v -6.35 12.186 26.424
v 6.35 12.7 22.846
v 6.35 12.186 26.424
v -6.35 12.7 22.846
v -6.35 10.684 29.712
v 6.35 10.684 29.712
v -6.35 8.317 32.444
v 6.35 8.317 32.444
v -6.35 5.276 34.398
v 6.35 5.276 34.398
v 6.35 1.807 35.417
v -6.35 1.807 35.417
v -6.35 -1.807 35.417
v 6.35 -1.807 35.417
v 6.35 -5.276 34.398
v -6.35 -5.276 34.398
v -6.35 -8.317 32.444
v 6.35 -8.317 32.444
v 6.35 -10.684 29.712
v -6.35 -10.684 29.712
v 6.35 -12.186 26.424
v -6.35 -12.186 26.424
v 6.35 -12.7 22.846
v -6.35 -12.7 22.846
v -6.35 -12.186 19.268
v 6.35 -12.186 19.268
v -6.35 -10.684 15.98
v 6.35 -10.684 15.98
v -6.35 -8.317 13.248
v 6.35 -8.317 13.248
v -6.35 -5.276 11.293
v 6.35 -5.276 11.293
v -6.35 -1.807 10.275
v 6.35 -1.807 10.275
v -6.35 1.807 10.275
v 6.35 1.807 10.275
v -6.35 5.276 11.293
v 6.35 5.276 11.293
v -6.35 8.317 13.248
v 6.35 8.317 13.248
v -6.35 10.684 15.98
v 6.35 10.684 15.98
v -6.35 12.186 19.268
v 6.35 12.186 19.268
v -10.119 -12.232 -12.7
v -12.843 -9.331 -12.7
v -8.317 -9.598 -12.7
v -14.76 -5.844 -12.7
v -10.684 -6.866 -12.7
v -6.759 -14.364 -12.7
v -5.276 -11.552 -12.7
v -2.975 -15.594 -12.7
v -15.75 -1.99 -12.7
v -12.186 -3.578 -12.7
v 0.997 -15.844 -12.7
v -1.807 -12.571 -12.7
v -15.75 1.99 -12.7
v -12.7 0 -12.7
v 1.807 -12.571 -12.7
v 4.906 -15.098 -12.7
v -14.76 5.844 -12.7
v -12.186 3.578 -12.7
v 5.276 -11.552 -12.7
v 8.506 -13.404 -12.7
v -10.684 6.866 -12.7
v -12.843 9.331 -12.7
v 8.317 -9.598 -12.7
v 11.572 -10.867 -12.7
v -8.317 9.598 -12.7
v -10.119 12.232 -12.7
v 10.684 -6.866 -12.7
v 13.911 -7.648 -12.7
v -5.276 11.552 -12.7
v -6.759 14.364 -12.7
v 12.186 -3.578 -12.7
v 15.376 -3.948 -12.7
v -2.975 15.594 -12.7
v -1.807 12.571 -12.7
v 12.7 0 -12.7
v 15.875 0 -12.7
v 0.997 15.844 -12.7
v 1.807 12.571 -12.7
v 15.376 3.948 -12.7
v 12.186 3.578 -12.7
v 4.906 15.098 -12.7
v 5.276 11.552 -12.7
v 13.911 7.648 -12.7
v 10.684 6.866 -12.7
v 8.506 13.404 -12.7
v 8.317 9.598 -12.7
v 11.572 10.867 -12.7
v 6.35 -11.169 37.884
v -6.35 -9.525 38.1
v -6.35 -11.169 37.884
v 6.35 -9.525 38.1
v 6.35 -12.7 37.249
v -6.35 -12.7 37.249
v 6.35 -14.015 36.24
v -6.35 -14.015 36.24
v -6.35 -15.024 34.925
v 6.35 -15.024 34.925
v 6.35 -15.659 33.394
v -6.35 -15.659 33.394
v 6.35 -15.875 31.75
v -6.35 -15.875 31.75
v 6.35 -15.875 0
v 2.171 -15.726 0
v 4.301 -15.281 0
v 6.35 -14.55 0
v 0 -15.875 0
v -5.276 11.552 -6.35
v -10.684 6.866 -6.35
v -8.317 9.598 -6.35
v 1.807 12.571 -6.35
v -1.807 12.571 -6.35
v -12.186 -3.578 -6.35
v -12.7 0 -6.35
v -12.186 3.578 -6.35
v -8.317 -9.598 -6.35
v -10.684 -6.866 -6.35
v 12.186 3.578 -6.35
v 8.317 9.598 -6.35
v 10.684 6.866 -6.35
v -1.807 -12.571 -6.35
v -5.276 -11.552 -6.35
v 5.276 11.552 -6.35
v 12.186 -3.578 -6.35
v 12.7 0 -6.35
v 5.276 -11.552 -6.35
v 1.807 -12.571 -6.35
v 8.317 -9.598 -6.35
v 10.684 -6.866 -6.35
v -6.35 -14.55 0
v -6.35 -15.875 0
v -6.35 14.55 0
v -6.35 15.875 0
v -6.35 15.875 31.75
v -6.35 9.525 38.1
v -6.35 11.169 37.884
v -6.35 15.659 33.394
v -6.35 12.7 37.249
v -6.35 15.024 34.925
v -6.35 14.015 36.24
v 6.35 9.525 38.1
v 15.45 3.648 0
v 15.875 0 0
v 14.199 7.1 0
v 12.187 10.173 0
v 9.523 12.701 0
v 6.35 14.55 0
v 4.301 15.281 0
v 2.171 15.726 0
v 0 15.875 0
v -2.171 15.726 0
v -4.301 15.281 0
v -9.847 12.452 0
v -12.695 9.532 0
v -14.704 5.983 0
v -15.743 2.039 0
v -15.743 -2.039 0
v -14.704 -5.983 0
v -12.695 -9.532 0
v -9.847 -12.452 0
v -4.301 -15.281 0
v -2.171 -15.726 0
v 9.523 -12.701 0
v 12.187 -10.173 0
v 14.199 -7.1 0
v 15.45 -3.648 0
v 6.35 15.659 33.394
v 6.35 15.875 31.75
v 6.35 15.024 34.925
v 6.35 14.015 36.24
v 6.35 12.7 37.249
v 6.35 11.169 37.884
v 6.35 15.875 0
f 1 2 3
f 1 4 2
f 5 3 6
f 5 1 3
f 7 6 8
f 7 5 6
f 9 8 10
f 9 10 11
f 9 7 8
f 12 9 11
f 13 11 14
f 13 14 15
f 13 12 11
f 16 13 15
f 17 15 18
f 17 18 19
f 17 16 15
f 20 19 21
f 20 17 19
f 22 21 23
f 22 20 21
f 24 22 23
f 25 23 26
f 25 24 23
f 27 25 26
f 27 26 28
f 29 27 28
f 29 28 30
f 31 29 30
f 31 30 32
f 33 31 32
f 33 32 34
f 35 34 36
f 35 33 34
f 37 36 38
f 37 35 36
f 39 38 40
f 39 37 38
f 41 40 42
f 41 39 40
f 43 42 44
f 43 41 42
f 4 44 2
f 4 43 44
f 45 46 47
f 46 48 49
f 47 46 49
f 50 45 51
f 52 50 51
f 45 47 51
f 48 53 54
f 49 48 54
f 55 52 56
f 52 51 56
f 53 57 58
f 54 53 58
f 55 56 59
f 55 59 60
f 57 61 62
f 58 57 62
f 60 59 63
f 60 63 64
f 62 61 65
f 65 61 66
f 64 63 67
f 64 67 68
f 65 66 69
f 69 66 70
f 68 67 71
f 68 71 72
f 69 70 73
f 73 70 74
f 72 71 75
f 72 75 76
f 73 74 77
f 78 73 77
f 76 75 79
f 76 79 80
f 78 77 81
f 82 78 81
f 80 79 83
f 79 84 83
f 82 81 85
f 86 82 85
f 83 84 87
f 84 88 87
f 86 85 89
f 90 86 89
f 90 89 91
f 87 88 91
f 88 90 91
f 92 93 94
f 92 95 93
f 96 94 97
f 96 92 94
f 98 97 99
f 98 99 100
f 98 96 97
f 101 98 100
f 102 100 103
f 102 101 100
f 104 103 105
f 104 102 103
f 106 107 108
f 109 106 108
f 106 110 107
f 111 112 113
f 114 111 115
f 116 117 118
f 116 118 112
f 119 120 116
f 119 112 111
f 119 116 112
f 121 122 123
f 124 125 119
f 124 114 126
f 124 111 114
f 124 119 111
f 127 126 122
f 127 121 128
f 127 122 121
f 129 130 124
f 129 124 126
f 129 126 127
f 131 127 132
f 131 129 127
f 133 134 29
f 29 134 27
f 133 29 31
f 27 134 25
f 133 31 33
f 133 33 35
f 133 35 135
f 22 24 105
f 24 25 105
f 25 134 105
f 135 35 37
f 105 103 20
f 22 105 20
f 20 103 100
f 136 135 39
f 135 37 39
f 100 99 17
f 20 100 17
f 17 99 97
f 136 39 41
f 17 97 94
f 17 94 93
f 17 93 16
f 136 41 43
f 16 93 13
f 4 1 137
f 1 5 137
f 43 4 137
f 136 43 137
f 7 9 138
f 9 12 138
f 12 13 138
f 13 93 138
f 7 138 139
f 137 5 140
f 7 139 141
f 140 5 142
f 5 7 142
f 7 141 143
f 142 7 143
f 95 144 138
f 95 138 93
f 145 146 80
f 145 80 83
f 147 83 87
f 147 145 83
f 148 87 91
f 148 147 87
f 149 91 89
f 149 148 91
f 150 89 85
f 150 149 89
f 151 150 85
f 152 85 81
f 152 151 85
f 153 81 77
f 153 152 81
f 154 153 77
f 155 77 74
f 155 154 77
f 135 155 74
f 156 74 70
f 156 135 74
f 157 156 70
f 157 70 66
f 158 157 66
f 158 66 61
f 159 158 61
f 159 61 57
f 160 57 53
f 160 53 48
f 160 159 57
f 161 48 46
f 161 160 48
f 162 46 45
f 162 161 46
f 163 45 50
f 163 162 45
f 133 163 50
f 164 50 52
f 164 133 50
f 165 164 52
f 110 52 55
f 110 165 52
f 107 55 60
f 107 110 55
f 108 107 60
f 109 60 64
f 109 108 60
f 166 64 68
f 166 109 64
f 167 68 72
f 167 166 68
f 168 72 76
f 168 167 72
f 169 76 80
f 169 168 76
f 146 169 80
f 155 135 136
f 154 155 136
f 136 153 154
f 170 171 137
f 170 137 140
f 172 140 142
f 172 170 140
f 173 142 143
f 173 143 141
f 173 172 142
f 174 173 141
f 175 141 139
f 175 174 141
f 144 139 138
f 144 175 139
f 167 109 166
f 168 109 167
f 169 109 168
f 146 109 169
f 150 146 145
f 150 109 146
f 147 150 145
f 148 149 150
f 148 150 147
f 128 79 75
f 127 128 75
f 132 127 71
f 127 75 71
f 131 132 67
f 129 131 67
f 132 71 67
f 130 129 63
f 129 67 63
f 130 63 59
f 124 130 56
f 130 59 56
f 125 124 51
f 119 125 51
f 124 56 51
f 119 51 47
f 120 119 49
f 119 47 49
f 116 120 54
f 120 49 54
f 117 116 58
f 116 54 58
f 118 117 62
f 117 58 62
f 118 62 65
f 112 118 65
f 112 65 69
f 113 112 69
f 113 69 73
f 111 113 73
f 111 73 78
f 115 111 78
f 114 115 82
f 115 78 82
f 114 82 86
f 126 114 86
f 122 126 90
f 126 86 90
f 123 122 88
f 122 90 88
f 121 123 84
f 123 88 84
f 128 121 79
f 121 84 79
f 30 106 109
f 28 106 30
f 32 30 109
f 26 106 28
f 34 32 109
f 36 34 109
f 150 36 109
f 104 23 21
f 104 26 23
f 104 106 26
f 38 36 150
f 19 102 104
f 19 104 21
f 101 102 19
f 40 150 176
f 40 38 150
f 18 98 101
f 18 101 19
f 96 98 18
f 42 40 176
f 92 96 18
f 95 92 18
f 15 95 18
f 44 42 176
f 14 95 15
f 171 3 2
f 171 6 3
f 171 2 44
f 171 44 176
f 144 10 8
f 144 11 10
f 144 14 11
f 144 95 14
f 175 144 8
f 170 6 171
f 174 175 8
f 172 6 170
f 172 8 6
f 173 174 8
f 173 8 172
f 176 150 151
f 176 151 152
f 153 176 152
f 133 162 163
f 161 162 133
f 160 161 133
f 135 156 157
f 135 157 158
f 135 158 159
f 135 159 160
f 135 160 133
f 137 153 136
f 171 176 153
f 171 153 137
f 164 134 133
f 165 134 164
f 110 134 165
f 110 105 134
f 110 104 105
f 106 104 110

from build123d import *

# Parameters (mm, degrees)
F0_R     = 12.7
F2_DEPTH = 6.35
F3_DEPTH = 6.35
F1_R     = 15.875
F1_R_2   = 12.7
F4_DEPTH = 12.7
F5_R     = 12.7
F6_DEPTH = 6.35


with BuildPart() as f2:
    # F0 (on Right) → F2 (new body)
    with BuildSketch(Plane.YZ):
        with BuildLine():
            Line((-15.875, 0), (15.875, 0))
            Line((15.875, 0), (15.875, 31.75))
            ThreePointArc((15.875, 31.75), (14.0151280605, 36.2401280605), (9.525, 38.1))
            Line((9.525, 38.1), (-9.525, 38.1))
            ThreePointArc((-9.525, 38.1), (-14.0151280605, 36.2401280605), (-15.875, 31.75))
            Line((-15.875, 31.75), (-15.875, 0))
        make_face()
        with Locations((0, 22.8458158672)):
            Circle(F0_R, mode=Mode.SUBTRACT)
    extrude(amount=F2_DEPTH)

    # F3 (add): a face of the model
    f3_faces = [f2.faces().sort_by_distance(p)[0] for p in [
        (0, 0, 0.4959508544),
    ]]
    extrude(f3_faces, amount=F3_DEPTH)

    # F1 (on Top) → F4 (join)
    with BuildSketch(Plane.XY):
        Circle(F1_R)
        Circle(F1_R_2, mode=Mode.SUBTRACT)
        Circle(F1_R_2)
    extrude(amount=-F4_DEPTH)

    # F5 (on face) → F6 (cut)
    with BuildSketch(Plane(origin=(0, 0, -12.7), x_dir=(1, 0, 0), z_dir=(0, 0, -1))):
        Circle(F5_R)
    extrude(amount=-F6_DEPTH, mode=Mode.SUBTRACT)


solid = f2.part
